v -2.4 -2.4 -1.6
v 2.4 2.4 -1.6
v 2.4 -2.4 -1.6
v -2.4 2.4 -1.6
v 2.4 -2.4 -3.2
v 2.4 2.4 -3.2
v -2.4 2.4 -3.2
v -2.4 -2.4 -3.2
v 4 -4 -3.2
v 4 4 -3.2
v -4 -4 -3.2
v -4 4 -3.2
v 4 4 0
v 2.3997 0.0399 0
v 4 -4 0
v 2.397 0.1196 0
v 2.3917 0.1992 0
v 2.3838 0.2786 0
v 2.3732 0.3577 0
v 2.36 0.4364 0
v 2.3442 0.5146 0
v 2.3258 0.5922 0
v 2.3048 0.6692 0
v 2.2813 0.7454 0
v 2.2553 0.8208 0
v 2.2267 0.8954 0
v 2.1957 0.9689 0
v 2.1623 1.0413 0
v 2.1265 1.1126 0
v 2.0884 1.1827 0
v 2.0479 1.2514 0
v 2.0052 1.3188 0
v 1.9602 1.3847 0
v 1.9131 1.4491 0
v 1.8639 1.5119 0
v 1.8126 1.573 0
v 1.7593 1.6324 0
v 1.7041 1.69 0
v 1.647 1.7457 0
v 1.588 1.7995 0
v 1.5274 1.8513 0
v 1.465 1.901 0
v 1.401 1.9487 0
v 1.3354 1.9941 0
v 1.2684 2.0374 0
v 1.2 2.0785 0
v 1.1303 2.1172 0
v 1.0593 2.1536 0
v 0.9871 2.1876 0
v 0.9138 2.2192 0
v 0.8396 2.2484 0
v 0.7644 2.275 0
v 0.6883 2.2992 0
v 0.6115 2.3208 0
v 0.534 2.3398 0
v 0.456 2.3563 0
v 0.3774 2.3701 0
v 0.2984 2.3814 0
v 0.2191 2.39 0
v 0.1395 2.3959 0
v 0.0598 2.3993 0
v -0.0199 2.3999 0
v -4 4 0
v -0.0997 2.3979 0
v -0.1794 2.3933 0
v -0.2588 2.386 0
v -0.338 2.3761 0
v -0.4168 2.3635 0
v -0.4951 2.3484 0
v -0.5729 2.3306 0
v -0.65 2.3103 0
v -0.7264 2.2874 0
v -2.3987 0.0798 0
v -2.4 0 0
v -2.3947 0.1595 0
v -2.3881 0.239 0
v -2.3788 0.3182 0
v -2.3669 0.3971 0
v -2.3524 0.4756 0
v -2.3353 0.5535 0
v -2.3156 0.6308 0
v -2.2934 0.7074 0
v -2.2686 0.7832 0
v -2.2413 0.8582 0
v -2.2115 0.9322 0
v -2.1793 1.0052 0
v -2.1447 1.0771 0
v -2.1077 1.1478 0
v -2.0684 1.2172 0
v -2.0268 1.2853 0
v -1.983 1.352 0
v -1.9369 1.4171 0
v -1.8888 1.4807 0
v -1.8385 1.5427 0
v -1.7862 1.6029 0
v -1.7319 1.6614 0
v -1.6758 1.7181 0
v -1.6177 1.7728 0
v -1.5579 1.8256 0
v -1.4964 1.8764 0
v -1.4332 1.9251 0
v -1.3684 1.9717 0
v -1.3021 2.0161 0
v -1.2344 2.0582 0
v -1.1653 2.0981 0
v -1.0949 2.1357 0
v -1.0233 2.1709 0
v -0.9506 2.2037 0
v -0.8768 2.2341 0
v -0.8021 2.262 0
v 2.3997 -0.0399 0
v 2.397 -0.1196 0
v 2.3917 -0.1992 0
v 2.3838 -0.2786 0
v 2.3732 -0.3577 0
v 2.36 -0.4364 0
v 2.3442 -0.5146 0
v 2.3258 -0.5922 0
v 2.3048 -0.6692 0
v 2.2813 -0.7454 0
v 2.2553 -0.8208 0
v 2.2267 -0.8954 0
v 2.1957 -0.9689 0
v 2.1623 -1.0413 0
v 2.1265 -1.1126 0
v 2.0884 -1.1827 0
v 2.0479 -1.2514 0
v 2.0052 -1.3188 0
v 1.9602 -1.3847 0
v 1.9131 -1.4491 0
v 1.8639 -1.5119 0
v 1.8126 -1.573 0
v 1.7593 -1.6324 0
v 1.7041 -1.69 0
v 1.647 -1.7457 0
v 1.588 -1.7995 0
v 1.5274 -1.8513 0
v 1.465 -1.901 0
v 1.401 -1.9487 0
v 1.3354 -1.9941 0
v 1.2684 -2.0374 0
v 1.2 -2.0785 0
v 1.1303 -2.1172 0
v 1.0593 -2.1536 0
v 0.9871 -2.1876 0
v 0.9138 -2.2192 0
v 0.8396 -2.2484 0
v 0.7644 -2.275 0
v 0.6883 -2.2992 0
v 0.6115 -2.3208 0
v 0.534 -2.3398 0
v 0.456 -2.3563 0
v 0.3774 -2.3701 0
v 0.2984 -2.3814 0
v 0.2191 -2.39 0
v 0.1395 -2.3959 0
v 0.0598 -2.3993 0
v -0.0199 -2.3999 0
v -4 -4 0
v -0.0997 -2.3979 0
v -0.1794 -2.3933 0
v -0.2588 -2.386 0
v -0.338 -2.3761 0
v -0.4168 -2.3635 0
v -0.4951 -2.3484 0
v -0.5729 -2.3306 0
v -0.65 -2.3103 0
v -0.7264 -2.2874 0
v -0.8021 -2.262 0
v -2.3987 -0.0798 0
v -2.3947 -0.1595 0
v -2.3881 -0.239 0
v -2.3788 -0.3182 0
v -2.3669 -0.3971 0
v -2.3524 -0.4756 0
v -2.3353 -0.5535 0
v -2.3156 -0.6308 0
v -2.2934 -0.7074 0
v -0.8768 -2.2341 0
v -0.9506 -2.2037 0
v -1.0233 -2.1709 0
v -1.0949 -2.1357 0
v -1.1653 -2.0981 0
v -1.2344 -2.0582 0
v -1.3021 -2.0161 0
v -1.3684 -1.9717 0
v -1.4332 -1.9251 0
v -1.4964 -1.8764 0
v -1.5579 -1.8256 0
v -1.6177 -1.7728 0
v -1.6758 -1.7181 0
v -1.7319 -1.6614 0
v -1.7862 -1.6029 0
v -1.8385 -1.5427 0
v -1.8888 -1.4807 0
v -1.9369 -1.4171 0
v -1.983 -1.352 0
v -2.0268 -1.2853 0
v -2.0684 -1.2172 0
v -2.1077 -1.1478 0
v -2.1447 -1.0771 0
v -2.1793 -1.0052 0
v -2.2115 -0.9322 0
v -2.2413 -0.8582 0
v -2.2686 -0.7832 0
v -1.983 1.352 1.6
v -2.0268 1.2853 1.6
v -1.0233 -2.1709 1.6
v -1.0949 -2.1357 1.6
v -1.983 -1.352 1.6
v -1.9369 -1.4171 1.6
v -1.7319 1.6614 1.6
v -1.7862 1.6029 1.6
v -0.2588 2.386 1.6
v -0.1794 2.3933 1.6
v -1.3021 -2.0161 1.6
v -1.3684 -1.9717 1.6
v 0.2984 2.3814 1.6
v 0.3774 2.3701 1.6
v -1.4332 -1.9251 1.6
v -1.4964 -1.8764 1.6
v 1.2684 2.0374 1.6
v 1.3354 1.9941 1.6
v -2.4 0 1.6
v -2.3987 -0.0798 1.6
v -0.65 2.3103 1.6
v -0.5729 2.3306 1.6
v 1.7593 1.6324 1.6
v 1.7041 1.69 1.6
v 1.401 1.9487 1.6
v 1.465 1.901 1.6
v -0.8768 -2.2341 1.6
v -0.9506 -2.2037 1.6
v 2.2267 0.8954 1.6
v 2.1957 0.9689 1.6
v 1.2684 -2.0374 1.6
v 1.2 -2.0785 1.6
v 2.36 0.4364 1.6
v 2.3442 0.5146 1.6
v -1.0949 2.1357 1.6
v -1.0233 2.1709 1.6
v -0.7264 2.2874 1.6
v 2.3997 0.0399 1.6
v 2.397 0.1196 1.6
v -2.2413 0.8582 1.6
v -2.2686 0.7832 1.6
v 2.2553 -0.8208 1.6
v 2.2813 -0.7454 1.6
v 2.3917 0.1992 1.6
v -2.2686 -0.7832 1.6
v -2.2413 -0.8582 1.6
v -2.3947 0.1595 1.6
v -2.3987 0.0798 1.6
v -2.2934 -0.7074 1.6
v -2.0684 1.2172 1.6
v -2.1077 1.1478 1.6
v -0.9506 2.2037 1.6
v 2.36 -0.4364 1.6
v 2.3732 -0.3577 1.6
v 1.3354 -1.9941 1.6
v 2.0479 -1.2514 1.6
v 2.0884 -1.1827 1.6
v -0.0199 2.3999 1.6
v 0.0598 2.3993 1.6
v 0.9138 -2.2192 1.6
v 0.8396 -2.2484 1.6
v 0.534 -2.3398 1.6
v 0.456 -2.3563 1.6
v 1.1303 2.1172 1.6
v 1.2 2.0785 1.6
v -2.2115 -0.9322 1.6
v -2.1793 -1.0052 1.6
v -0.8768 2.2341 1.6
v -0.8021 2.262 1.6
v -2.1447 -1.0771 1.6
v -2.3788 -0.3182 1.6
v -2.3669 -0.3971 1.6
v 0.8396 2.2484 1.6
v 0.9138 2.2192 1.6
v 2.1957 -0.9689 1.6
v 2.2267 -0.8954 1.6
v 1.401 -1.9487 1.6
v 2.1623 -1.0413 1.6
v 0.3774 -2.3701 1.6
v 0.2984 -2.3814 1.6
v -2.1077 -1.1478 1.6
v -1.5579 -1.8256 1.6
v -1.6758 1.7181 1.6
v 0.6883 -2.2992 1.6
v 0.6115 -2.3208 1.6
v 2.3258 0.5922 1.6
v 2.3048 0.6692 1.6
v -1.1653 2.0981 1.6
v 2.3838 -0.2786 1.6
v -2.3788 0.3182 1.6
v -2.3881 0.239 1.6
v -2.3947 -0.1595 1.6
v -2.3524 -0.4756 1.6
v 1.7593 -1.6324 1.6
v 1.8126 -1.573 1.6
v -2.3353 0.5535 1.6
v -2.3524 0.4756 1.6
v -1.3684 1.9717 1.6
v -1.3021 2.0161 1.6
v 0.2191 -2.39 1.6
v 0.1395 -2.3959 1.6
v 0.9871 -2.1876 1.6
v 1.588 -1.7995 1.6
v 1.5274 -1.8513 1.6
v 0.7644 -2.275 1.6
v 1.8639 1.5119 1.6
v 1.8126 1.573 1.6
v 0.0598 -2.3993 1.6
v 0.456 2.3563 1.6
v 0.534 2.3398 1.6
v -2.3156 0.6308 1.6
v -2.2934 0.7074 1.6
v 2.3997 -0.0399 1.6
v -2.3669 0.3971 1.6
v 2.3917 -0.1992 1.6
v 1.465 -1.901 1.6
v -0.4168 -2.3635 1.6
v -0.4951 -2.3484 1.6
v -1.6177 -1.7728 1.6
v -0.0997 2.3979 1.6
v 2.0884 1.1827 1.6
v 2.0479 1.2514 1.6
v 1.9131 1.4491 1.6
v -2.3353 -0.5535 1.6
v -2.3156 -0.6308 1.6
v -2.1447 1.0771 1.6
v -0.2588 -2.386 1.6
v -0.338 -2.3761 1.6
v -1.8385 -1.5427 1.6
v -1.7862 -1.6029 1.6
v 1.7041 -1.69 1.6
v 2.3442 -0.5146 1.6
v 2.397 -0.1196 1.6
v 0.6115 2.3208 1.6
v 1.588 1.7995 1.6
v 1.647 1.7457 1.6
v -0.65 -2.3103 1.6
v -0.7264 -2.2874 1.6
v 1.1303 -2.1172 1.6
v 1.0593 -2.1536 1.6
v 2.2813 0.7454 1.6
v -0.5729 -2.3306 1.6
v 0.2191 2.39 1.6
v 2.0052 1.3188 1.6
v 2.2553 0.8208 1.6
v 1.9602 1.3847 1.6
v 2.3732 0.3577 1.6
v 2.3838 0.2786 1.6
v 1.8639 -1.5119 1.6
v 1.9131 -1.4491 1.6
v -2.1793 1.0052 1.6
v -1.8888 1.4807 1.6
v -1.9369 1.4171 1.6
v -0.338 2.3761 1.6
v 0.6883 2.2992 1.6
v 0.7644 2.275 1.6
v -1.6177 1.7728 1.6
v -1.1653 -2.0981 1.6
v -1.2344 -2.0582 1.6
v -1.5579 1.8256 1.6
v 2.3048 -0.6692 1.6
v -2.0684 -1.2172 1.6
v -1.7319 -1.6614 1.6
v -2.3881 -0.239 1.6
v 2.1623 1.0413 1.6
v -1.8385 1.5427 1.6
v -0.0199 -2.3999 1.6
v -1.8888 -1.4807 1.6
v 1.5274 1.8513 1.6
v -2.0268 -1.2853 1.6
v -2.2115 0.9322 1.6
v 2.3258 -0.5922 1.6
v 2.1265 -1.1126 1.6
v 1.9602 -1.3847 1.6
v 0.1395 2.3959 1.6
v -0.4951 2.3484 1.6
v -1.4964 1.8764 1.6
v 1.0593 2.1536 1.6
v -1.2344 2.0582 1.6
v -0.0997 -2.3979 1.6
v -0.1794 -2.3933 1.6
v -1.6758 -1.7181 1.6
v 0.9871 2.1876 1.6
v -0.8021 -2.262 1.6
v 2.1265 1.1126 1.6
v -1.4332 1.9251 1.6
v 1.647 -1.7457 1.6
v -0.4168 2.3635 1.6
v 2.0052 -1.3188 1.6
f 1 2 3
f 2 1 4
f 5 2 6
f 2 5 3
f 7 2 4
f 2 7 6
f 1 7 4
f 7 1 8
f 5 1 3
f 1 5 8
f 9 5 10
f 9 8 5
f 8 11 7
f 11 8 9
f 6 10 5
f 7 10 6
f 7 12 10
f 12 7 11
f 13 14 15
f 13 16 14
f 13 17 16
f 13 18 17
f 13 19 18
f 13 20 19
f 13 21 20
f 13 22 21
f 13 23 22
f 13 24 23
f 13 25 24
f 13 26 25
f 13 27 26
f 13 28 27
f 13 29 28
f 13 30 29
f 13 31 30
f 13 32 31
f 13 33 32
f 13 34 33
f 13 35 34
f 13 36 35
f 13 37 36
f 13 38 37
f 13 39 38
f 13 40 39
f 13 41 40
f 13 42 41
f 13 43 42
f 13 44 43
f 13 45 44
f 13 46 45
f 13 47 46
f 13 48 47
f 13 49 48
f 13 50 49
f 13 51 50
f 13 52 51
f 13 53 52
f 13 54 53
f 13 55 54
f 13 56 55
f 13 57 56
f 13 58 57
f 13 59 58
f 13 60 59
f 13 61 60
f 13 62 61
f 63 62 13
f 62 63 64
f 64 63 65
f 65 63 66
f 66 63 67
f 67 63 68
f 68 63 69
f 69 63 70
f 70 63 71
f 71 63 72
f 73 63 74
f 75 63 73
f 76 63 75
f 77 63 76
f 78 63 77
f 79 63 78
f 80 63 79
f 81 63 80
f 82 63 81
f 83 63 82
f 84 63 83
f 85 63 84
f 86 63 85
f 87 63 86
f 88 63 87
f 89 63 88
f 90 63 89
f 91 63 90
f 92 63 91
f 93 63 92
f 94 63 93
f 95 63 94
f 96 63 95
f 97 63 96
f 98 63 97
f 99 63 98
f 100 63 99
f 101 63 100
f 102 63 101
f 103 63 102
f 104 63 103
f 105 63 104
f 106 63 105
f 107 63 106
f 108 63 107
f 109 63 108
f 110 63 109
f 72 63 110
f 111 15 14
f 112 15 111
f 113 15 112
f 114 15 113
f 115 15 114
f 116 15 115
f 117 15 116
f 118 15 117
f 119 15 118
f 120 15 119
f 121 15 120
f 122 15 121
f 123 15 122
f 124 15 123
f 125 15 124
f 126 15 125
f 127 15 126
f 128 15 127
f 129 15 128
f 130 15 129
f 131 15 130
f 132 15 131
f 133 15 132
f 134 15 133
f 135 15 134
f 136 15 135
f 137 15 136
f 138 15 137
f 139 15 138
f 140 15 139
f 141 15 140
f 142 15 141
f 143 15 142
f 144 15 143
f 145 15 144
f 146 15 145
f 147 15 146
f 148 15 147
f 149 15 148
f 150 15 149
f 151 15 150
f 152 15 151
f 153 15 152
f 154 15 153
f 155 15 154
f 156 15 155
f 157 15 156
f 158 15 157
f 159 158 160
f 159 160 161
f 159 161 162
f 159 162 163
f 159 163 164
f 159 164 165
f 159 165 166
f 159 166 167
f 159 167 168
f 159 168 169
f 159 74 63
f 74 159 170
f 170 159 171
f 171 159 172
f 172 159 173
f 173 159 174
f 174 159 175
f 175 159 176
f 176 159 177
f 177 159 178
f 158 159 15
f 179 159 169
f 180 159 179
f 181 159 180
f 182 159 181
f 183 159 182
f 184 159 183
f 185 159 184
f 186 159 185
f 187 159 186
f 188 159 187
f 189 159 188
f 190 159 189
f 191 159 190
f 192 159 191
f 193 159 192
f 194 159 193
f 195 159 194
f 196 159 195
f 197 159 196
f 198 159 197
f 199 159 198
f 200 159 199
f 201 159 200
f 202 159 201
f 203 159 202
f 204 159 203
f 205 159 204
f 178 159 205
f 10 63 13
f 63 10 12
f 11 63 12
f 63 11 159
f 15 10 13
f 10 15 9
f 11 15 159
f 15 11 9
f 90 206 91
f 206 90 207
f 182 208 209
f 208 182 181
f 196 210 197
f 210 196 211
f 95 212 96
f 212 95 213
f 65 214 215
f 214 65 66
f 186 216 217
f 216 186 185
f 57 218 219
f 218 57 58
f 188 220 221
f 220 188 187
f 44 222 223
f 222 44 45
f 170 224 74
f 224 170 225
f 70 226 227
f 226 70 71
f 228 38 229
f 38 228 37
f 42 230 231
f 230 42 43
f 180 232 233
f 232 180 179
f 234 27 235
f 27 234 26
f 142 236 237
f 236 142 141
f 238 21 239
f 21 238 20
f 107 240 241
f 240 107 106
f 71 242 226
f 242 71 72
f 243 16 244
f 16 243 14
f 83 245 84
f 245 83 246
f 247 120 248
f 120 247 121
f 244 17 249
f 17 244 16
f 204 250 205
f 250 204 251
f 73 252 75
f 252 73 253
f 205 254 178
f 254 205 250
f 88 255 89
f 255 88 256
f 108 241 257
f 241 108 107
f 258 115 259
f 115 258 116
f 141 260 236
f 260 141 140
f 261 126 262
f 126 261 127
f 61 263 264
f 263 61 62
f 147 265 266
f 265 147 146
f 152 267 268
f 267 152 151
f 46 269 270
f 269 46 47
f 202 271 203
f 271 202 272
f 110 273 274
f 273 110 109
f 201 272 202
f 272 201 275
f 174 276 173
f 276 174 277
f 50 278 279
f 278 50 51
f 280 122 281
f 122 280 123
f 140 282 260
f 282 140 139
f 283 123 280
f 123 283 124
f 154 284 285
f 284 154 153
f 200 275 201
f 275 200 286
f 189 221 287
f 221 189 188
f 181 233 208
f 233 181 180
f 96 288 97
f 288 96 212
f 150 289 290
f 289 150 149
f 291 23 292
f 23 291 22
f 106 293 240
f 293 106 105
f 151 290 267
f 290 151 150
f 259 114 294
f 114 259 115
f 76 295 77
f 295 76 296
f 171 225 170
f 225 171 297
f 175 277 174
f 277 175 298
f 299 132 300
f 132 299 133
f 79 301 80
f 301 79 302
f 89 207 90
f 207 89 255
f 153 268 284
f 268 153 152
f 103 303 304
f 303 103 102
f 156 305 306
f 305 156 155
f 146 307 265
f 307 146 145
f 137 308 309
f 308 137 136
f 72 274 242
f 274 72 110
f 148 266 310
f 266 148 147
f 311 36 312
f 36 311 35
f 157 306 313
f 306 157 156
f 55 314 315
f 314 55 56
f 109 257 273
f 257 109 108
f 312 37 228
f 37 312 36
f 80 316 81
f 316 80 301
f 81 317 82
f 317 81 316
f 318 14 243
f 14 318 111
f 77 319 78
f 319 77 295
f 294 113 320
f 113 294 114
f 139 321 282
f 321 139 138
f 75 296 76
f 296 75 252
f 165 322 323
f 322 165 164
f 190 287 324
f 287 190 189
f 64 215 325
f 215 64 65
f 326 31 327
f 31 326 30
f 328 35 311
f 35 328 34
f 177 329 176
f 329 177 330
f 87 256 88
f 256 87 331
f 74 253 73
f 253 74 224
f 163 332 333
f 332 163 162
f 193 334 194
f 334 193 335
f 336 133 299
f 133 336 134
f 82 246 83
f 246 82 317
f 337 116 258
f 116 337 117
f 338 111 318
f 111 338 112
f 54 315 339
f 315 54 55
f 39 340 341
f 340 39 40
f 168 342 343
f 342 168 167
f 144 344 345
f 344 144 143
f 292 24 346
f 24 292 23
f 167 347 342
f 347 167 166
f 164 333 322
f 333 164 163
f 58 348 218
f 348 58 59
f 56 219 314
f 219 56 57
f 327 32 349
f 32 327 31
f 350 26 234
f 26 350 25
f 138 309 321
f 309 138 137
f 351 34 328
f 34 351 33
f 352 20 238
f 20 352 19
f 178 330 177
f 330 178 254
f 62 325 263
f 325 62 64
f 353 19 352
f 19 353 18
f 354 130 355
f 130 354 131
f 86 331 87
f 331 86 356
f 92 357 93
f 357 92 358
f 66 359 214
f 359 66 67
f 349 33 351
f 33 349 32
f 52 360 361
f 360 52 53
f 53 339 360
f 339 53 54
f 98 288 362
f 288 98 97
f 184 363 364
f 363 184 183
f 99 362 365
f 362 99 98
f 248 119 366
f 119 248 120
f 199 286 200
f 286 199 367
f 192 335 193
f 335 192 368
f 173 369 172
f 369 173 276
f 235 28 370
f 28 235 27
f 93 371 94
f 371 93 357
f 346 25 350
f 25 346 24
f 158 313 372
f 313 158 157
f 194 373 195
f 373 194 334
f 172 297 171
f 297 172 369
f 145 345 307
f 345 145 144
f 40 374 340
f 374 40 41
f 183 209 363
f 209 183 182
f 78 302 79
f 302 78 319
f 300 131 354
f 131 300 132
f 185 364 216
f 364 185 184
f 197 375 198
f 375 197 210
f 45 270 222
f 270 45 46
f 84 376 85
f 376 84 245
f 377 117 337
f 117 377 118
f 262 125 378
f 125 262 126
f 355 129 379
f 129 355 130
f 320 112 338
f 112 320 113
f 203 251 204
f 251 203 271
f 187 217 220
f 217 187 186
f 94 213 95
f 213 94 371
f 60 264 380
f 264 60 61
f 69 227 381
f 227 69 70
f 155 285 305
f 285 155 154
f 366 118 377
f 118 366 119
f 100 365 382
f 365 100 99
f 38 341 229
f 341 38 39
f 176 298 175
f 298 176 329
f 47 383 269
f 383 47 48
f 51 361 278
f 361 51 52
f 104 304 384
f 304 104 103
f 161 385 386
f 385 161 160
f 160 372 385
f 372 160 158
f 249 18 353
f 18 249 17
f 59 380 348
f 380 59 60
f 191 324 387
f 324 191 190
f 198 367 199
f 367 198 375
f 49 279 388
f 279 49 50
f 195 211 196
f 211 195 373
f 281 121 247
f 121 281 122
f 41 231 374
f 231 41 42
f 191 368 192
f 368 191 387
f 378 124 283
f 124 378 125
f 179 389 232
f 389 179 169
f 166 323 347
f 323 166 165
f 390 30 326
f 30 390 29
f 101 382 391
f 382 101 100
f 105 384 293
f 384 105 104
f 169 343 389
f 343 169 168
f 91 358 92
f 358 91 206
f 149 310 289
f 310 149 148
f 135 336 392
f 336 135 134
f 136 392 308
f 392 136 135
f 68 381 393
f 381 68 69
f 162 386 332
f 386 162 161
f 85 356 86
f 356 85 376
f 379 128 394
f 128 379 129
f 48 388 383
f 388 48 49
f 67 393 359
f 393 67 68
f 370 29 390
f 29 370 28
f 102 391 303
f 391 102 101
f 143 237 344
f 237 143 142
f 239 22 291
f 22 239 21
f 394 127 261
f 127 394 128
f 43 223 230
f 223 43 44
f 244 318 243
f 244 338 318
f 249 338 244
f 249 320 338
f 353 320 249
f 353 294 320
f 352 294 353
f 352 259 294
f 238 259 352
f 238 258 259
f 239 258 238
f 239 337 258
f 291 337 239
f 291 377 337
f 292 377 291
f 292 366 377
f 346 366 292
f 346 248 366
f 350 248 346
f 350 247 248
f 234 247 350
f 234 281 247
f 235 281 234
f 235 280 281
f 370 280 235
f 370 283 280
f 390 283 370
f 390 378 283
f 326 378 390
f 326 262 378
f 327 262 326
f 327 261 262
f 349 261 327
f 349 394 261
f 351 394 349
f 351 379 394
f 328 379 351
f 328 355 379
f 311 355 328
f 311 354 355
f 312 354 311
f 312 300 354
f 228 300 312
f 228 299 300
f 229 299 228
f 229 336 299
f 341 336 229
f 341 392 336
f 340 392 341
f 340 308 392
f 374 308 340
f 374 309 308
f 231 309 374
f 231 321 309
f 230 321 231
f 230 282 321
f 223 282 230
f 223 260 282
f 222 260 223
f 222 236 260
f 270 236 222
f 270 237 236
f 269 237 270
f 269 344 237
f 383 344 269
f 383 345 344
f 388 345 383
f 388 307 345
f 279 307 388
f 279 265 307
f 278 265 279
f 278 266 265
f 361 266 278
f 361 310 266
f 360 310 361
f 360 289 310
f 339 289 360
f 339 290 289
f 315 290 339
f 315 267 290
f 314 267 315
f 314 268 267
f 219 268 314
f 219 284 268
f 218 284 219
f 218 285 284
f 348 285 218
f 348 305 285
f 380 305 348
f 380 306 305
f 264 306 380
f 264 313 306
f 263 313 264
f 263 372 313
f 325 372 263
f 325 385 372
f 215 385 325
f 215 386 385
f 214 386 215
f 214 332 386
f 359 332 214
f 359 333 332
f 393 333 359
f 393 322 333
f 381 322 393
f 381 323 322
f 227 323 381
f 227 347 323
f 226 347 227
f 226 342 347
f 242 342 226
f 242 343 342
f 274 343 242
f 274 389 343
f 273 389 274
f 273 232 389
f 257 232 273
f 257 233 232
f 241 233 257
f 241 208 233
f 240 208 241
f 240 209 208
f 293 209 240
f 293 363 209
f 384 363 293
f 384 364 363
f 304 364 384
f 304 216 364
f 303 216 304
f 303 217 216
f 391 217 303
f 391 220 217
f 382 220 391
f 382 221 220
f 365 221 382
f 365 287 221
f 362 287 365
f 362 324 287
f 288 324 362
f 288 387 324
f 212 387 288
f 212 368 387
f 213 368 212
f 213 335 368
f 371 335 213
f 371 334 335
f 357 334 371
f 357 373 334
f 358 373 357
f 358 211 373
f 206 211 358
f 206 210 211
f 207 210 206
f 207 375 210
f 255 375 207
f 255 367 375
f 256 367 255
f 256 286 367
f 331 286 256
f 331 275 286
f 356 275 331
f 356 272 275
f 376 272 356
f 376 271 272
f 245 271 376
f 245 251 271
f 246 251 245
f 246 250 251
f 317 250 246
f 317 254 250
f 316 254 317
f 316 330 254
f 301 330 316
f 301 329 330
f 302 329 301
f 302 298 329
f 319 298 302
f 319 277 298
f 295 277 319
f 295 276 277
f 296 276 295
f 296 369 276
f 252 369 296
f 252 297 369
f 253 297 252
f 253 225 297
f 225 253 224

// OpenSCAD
// file: ../p/stud3.scad
use <../lib.scad>
use <4-4cyli.scad>
use <4-4disc.scad>
use <4-4edge.scad>
$fa=1; $fs=0.2;
function ldraw_lib__stud3(realsolid=false) = realsolid ? 
    [openscad(translate([0,0,-eps()], o=cylinder(4+eps(), r=4)),2)] : [
// 0 Stud Tube Solid
// 0 Name: stud3.dat
// 0 Author: James Jessiman
// 0 !LDRAW_ORG Primitive UPDATE 2012-01
// 0 !LICENSE Licensed under CC BY 2.0 and CC BY 4.0 : see CAreadme.txt
// 
// 0 BFC CERTIFY CCW
  [0,"BFC","CERTIFY"],
  [0,"BFC","CCW"],
// 
// 0 !HISTORY 2002-04-04 [sbliss] Modified for BFC compliance
// 0 !HISTORY 2002-04-25 [PTadmin] Official Update 2002-02
// 0 !HISTORY 2007-06-24 [PTadmin] Header formatted for Contributor Agreement
// 0 !HISTORY 2008-07-01 [PTadmin] Official Update 2008-01
// 0 !HISTORY 2012-02-16 [Philo] Changed to CCW
// 0 !HISTORY 2012-03-30 [PTadmin] Official Update 2012-01
// 
// 
// 1 16 0 -4 0 4 0 0 0 1 0 0 0 4 4-4edge.dat
  [1,16,0,-4,0,4,0,0,0,1,0,0,0,4, ldraw_lib__4_4edge(realsolid)],
// 1 16 0 0 0 4 0 0 0 1 0 0 0 4 4-4edge.dat
  [1,16,0,0,0,4,0,0,0,1,0,0,0,4, ldraw_lib__4_4edge(realsolid)],
// 1 16 0 -4 0 4 0 0 0 1 0 0 0 4 4-4disc.dat
  [1,16,0,-4,0,4,0,0,0,1,0,0,0,4, ldraw_lib__4_4disc(realsolid)],
// 1 16 0 -4 0 4 0 0 0 4 0 0 0 4 4-4cyli.dat
  [1,16,0,-4,0,4,0,0,0,4,0,0,0,4, ldraw_lib__4_4cyli(realsolid)],
];
module ldraw_lib__stud3(step=0, col=false, unit=2/5, alt=false, line=0.2, solid=!$preview)
    makepoly(ldraw_lib__stud3(solid), step=step, col=col, unit=unit, alt=alt, line=line, solid=solid);
ldraw_lib__stud3(line=0.2);
// file: ../p/4-4edge.scad
use <../lib.scad>
$fa=1; $fs=0.2;
function ldraw_lib__4_4edge(realsolid=false) = [
// 0 Circle 1.0
// 0 Name: 4-4edge.dat
// 0 Author: James Jessiman
// 0 !LDRAW_ORG Primitive UPDATE 2017-01
// 0 !LICENSE Licensed under CC BY 2.0 and CC BY 4.0 : see CAreadme.txt
// 
// 0 BFC CERTIFY CCW
  [0,"BFC","CERTIFY"],
  [0,"BFC","CCW"],
// 
// 0 !HISTORY 1998-12-15 [PTadmin] Official Update 1998-10
// 0 !HISTORY 2005-12-28 [PTadmin] Official Update 2005-01
// 0 !HISTORY 2007-06-24 [PTadmin] Header formatted for Contributor Agreement
// 0 !HISTORY 2008-07-01 [PTadmin] Official Update 2008-01
// 0 !HISTORY 2017-01-15 [Steffen] BFCed
// 0 !HISTORY 2017-12-30 [PTadmin] Official Update 2017-01
// 
// 
// 2 24 1 0 0 0.9239 0 0.3827
  [2,24,1,0,0,0.9239,0,0.3827],
// 2 24 0.9239 0 0.3827 0.7071 0 0.7071
  [2,24,0.9239,0,0.3827,0.7071,0,0.7071],
// 2 24 0.7071 0 0.7071 0.3827 0 0.9239
  [2,24,0.7071,0,0.7071,0.3827,0,0.9239],
// 2 24 0.3827 0 0.9239 0 0 1
  [2,24,0.3827,0,0.9239,0,0,1],
// 2 24 0 0 1 -0.3827 0 0.9239
  [2,24,0,0,1,-0.3827,0,0.9239],
// 2 24 -0.3827 0 0.9239 -0.7071 0 0.7071
  [2,24,-0.3827,0,0.9239,-0.7071,0,0.7071],
// 2 24 -0.7071 0 0.7071 -0.9239 0 0.3827
  [2,24,-0.7071,0,0.7071,-0.9239,0,0.3827],
// 2 24 -0.9239 0 0.3827 -1 0 -0
  [2,24,-0.9239,0,0.3827,-1,0,-0],
// 2 24 -1 0 -0 -0.9239 0 -0.3827
  [2,24,-1,0,-0,-0.9239,0,-0.3827],
// 2 24 -0.9239 0 -0.3827 -0.7071 0 -0.7071
  [2,24,-0.9239,0,-0.3827,-0.7071,0,-0.7071],
// 2 24 -0.7071 0 -0.7071 -0.3827 0 -0.9239
  [2,24,-0.7071,0,-0.7071,-0.3827,0,-0.9239],
// 2 24 -0.3827 0 -0.9239 0 0 -1
  [2,24,-0.3827,0,-0.9239,0,0,-1],
// 2 24 0 0 -1 0.3827 0 -0.9239
  [2,24,0,0,-1,0.3827,0,-0.9239],
// 2 24 0.3827 0 -0.9239 0.7071 0 -0.7071
  [2,24,0.3827,0,-0.9239,0.7071,0,-0.7071],
// 2 24 0.7071 0 -0.7071 0.9239 0 -0.3827
  [2,24,0.7071,0,-0.7071,0.9239,0,-0.3827],
// 2 24 0.9239 0 -0.3827 1 0 0
  [2,24,0.9239,0,-0.3827,1,0,0],
];
module ldraw_lib__4_4edge(step=0, col=false, unit=2/5, alt=false, line=0.2, solid=!$preview)
    makepoly(ldraw_lib__4_4edge(solid), step=step, col=col, unit=unit, alt=alt, line=line, solid=solid);
ldraw_lib__4_4edge(line=0.2);
// file: ../p/4-4disc.scad
use <../lib.scad>
$fa=1; $fs=0.2;
function ldraw_lib__4_4disc(realsolid=false) = [
// 0 Disc 1.0
// 0 Name: 4-4disc.dat
// 0 Author: James Jessiman
// 0 !LDRAW_ORG Primitive UPDATE 2002-02
// 0 !LICENSE Licensed under CC BY 2.0 and CC BY 4.0 : see CAreadme.txt
// 
// 0 BFC CERTIFY CCW
  [0,"BFC","CERTIFY"],
  [0,"BFC","CCW"],
// 
// 0 !HISTORY 1998-12-15 [PTadmin] Official Update 1998-10
// 0 !HISTORY 2002-03-23 [sbliss] Added BFC statement
// 0 !HISTORY 2002-04-25 [PTadmin] Official Update 2002-02
// 0 !HISTORY 2007-06-24 [PTadmin] Header formatted for Contributor Agreement
// 0 !HISTORY 2008-07-01 [PTadmin] Official Update 2008-01
// 
// 
// 3 16 0 0 0 1 0 0 0.9239 0 0.3827
  [3,16,0,0,0,1,0,0,0.9239,0,0.3827],
// 3 16 0 0 0 0.9239 0 0.3827 0.7071 0 0.7071
  [3,16,0,0,0,0.9239,0,0.3827,0.7071,0,0.7071],
// 3 16 0 0 0 0.7071 0 0.7071 0.3827 0 0.9239
  [3,16,0,0,0,0.7071,0,0.7071,0.3827,0,0.9239],
// 3 16 0 0 0 0.3827 0 0.9239 0 0 1
  [3,16,0,0,0,0.3827,0,0.9239,0,0,1],
// 3 16 0 0 0 0 0 1 -0.3827 0 0.9239
  [3,16,0,0,0,0,0,1,-0.3827,0,0.9239],
// 3 16 0 0 0 -0.3827 0 0.9239 -0.7071 0 0.7071
  [3,16,0,0,0,-0.3827,0,0.9239,-0.7071,0,0.7071],
// 3 16 0 0 0 -0.7071 0 0.7071 -0.9239 0 0.3827
  [3,16,0,0,0,-0.7071,0,0.7071,-0.9239,0,0.3827],
// 3 16 0 0 0 -0.9239 0 0.3827 -1 0 -0
  [3,16,0,0,0,-0.9239,0,0.3827,-1,0,-0],
// 3 16 0 0 0 -1 0 -0 -0.9239 0 -0.3827
  [3,16,0,0,0,-1,0,-0,-0.9239,0,-0.3827],
// 3 16 0 0 0 -0.9239 0 -0.3827 -0.7071 0 -0.7071
  [3,16,0,0,0,-0.9239,0,-0.3827,-0.7071,0,-0.7071],
// 3 16 0 0 0 -0.7071 0 -0.7071 -0.3827 0 -0.9239
  [3,16,0,0,0,-0.7071,0,-0.7071,-0.3827,0,-0.9239],
// 3 16 0 0 0 -0.3827 0 -0.9239 0 0 -1
  [3,16,0,0,0,-0.3827,0,-0.9239,0,0,-1],
// 3 16 0 0 0 0 0 -1 0.3827 0 -0.9239
  [3,16,0,0,0,0,0,-1,0.3827,0,-0.9239],
// 3 16 0 0 0 0.3827 0 -0.9239 0.7071 0 -0.7071
  [3,16,0,0,0,0.3827,0,-0.9239,0.7071,0,-0.7071],
// 3 16 0 0 0 0.7071 0 -0.7071 0.9239 0 -0.3827
  [3,16,0,0,0,0.7071,0,-0.7071,0.9239,0,-0.3827],
// 3 16 0 0 0 0.9239 0 -0.3827 1 0 0
  [3,16,0,0,0,0.9239,0,-0.3827,1,0,0],
// 0
];
module ldraw_lib__4_4disc(step=0, col=false, unit=2/5, alt=false, line=0.2, solid=!$preview)
    makepoly(ldraw_lib__4_4disc(solid), step=step, col=col, unit=unit, alt=alt, line=line, solid=solid);
ldraw_lib__4_4disc(line=0.2);
// file: ../p/4-4cyli.scad
use <../lib.scad>
$fa=1; $fs=0.2;
function ldraw_lib__4_4cyli(realsolid=false) = [
// 0 Cylinder 1.0
// 0 Name: 4-4cyli.dat
// 0 Author: James Jessiman
// 0 !LDRAW_ORG Primitive UPDATE 2005-01
// 0 !LICENSE Licensed under CC BY 2.0 and CC BY 4.0 : see CAreadme.txt
// 
// 0 BFC CERTIFY CCW
  [0,"BFC","CERTIFY"],
  [0,"BFC","CCW"],
// 
// 0 !HISTORY 1998-12-15 [PTadmin] Official Update 1998-10
// 0 !HISTORY 2002-03-23 [sbliss] Added BFC statement; merged headers from files in distributions LDraw 0.27 and Complete.
// 0 !HISTORY 2002-04-25 [PTadmin] Official Update 2002-02
// 0 !HISTORY 2004-12-14 [guyvivan] BFC CCW
// 0 !HISTORY 2005-12-28 [PTadmin] Official Update 2005-01
// 0 !HISTORY 2007-06-24 [PTadmin] Header formatted for Contributor Agreement
// 0 !HISTORY 2008-07-01 [PTadmin] Official Update 2008-01
// 
// 
// 4 16 1 1 0 0.9239 1 0.3827 0.9239 0 0.3827 1 0 0
  [4,16,1,1,0,0.9239,1,0.3827,0.9239,0,0.3827,1,0,0],
// 5 24 1 0 0 1 1 0 0.9239 0 0.3827 0.9239 0 -0.3827
  [5,24,1,0,0,1,1,0,0.9239,0,0.3827,0.9239,0,-0.3827],
// 4 16 0.9239 1 0.3827 0.7071 1 0.7071 0.7071 0 0.7071 0.9239 0 0.3827
  [4,16,0.9239,1,0.3827,0.7071,1,0.7071,0.7071,0,0.7071,0.9239,0,0.3827],
// 5 24 0.9239 0 0.3827 0.9239 1 0.3827 0.7071 0 0.7071 1 0 0
  [5,24,0.9239,0,0.3827,0.9239,1,0.3827,0.7071,0,0.7071,1,0,0],
// 4 16 0.7071 1 0.7071 0.3827 1 0.9239 0.3827 0 0.9239 0.7071 0 0.7071
  [4,16,0.7071,1,0.7071,0.3827,1,0.9239,0.3827,0,0.9239,0.7071,0,0.7071],
// 5 24 0.7071 0 0.7071 0.7071 1 0.7071 0.3827 0 0.9239 0.9239 0 0.3827
  [5,24,0.7071,0,0.7071,0.7071,1,0.7071,0.3827,0,0.9239,0.9239,0,0.3827],
// 4 16 0.3827 1 0.9239 0 1 1 0 0 1 0.3827 0 0.9239
  [4,16,0.3827,1,0.9239,0,1,1,0,0,1,0.3827,0,0.9239],
// 5 24 0.3827 0 0.9239 0.3827 1 0.9239 0 0 1 0.7071 0 0.7071
  [5,24,0.3827,0,0.9239,0.3827,1,0.9239,0,0,1,0.7071,0,0.7071],
// 4 16 0 1 1 -0.3827 1 0.9239 -0.3827 0 0.9239 0 0 1
  [4,16,0,1,1,-0.3827,1,0.9239,-0.3827,0,0.9239,0,0,1],
// 5 24 0 0 1 0 1 1 -0.3827 0 0.9239 0.3827 0 0.9239
  [5,24,0,0,1,0,1,1,-0.3827,0,0.9239,0.3827,0,0.9239],
// 4 16 -0.3827 1 0.9239 -0.7071 1 0.7071 -0.7071 0 0.7071 -0.3827 0 0.9239
  [4,16,-0.3827,1,0.9239,-0.7071,1,0.7071,-0.7071,0,0.7071,-0.3827,0,0.9239],
// 5 24 -0.3827 0 0.9239 -0.3827 1 0.9239 -0.7071 0 0.7071 0 0 1
  [5,24,-0.3827,0,0.9239,-0.3827,1,0.9239,-0.7071,0,0.7071,0,0,1],
// 4 16 -0.7071 1 0.7071 -0.9239 1 0.3827 -0.9239 0 0.3827 -0.7071 0 0.7071
  [4,16,-0.7071,1,0.7071,-0.9239,1,0.3827,-0.9239,0,0.3827,-0.7071,0,0.7071],
// 5 24 -0.7071 0 0.7071 -0.7071 1 0.7071 -0.9239 0 0.3827 -0.3827 0 0.9239
  [5,24,-0.7071,0,0.7071,-0.7071,1,0.7071,-0.9239,0,0.3827,-0.3827,0,0.9239],
// 4 16 -0.9239 1 0.3827 -1 1 0 -1 0 0 -0.9239 0 0.3827
  [4,16,-0.9239,1,0.3827,-1,1,0,-1,0,0,-0.9239,0,0.3827],
// 5 24 -0.9239 0 0.3827 -0.9239 1 0.3827 -1 0 0 -0.7071 0 0.7071
  [5,24,-0.9239,0,0.3827,-0.9239,1,0.3827,-1,0,0,-0.7071,0,0.7071],
// 4 16 -1 1 0 -0.9239 1 -0.3827 -0.9239 0 -0.3827 -1 0 0
  [4,16,-1,1,0,-0.9239,1,-0.3827,-0.9239,0,-0.3827,-1,0,0],
// 5 24 -1 0 0 -1 1 0 -0.9239 0 -0.3827 -0.9239 0 0.3827
  [5,24,-1,0,0,-1,1,0,-0.9239,0,-0.3827,-0.9239,0,0.3827],
// 4 16 -0.9239 1 -0.3827 -0.7071 1 -0.7071 -0.7071 0 -0.7071 -0.9239 0 -0.3827
  [4,16,-0.9239,1,-0.3827,-0.7071,1,-0.7071,-0.7071,0,-0.7071,-0.9239,0,-0.3827],
// 5 24 -0.9239 0 -0.3827 -0.9239 1 -0.3827 -0.7071 0 -0.7071 -1 0 0
  [5,24,-0.9239,0,-0.3827,-0.9239,1,-0.3827,-0.7071,0,-0.7071,-1,0,0],
// 4 16 -0.7071 1 -0.7071 -0.3827 1 -0.9239 -0.3827 0 -0.9239 -0.7071 0 -0.7071
  [4,16,-0.7071,1,-0.7071,-0.3827,1,-0.9239,-0.3827,0,-0.9239,-0.7071,0,-0.7071],
// 5 24 -0.7071 0 -0.7071 -0.7071 1 -0.7071 -0.3827 0 -0.9239 -0.9239 0 -0.3827
  [5,24,-0.7071,0,-0.7071,-0.7071,1,-0.7071,-0.3827,0,-0.9239,-0.9239,0,-0.3827],
// 4 16 -0.3827 1 -0.9239 0 1 -1 0 0 -1 -0.3827 0 -0.9239
  [4,16,-0.3827,1,-0.9239,0,1,-1,0,0,-1,-0.3827,0,-0.9239],
// 5 24 -0.3827 0 -0.9239 -0.3827 1 -0.9239 0 0 -1 -0.7071 0 -0.7071
  [5,24,-0.3827,0,-0.9239,-0.3827,1,-0.9239,0,0,-1,-0.7071,0,-0.7071],
// 4 16 0 1 -1 0.3827 1 -0.9239 0.3827 0 -0.9239 0 0 -1
  [4,16,0,1,-1,0.3827,1,-0.9239,0.3827,0,-0.9239,0,0,-1],
// 5 24 0 0 -1 0 1 -1 0.3827 0 -0.9239 -0.3827 0 -0.9239
  [5,24,0,0,-1,0,1,-1,0.3827,0,-0.9239,-0.3827,0,-0.9239],
// 4 16 0.3827 1 -0.9239 0.7071 1 -0.7071 0.7071 0 -0.7071 0.3827 0 -0.9239
  [4,16,0.3827,1,-0.9239,0.7071,1,-0.7071,0.7071,0,-0.7071,0.3827,0,-0.9239],
// 5 24 0.3827 0 -0.9239 0.3827 1 -0.9239 0.7071 0 -0.7071 0 0 -1
  [5,24,0.3827,0,-0.9239,0.3827,1,-0.9239,0.7071,0,-0.7071,0,0,-1],
// 4 16 0.7071 1 -0.7071 0.9239 1 -0.3827 0.9239 0 -0.3827 0.7071 0 -0.7071
  [4,16,0.7071,1,-0.7071,0.9239,1,-0.3827,0.9239,0,-0.3827,0.7071,0,-0.7071],
// 5 24 0.7071 0 -0.7071 0.7071 1 -0.7071 0.9239 0 -0.3827 0.3827 0 -0.9239
  [5,24,0.7071,0,-0.7071,0.7071,1,-0.7071,0.9239,0,-0.3827,0.3827,0,-0.9239],
// 4 16 0.9239 1 -0.3827 1 1 0 1 0 0 0.9239 0 -0.3827
  [4,16,0.9239,1,-0.3827,1,1,0,1,0,0,0.9239,0,-0.3827],
// 5 24 0.9239 0 -0.3827 0.9239 1 -0.3827 1 0 0 0.7071 0 -0.7071
  [5,24,0.9239,0,-0.3827,0.9239,1,-0.3827,1,0,0,0.7071,0,-0.7071],
// 0
];
module ldraw_lib__4_4cyli(step=0, col=false, unit=2/5, alt=false, line=0.2, solid=!$preview)
    makepoly(ldraw_lib__4_4cyli(solid), step=step, col=col, unit=unit, alt=alt, line=line, solid=solid);
ldraw_lib__4_4cyli(line=0.2);
// file: s/3004s01.scad
use <../../lib.scad>
use <../../p/box4t.scad>
use <../../p/box5.scad>
use <../../p/stud.scad>
use <../../p/stud3.scad>
$fa=1; $fs=0.2;
function ldraw_lib__s__3004s01(realsolid=false) = [
// 0 ~Brick  1 x  2 without Front Face
// 0 Name: s\3004s01.dat
// 0 Author: James Jessiman
// 0 !LDRAW_ORG Subpart UPDATE 2003-03
// 0 !LICENSE Licensed under CC BY 2.0 and CC BY 4.0 : see CAreadme.txt
// 
// 0 BFC CERTIFY CCW
  [0,"BFC","CERTIFY"],
  [0,"BFC","CCW"],
// 
// 0 !HISTORY 2003-09-07 [jriley] Subfiling, BFC
// 0 !HISTORY 2003-12-19 [PTadmin] Official Update 2003-03
// 0 !HISTORY 2007-08-29 [PTadmin] Header formatted for Contributor Agreement
// 0 !HISTORY 2008-07-01 [PTadmin] Official Update 2008-01
// 
// 
// 1 16 0 4 0 1 0 0 0 -5 0 0 0 1 stud3.dat
  [1,16,0,4,0,1,0,0,0,-5,0,0,0,1, ldraw_lib__stud3(realsolid)],
// 0 BFC INVERTNEXT
  [0,"BFC","INVERTNEXT"],
// 1 16 0 24 0 16 0 0 0 -20 0 0 0 6 box5.dat
  [1,16,0,24,0,16,0,0,0,-20,0,0,0,6, ldraw_lib__box5(realsolid)],
// 4 16 20 24 10 16 24 6 -16 24 6 -20 24 10
  [4,16,20,24,10,16,24,6,-16,24,6,-20,24,10],
// 4 16 -20 24 10 -16 24 6 -16 24 -6 -20 24 -10
  [4,16,-20,24,10,-16,24,6,-16,24,-6,-20,24,-10],
// 4 16 -20 24 -10 -16 24 -6 16 24 -6 20 24 -10
  [4,16,-20,24,-10,-16,24,-6,16,24,-6,20,24,-10],
// 4 16 20 24 -10 16 24 -6 16 24 6 20 24 10
  [4,16,20,24,-10,16,24,-6,16,24,6,20,24,10],
// 1 16 0 24 0 20 0 0 0 -24 0 0 0 10 box4t.dat
  [1,16,0,24,0,20,0,0,0,-24,0,0,0,10, ldraw_lib__box4t(realsolid)],
// 1 16 10 0 0 1 0 0 0 1 0 0 0 1 stud.dat
  [1,16,10,0,0,1,0,0,0,1,0,0,0,1, ldraw_lib__stud(realsolid)],
// 1 16 -10 0 0 1 0 0 0 1 0 0 0 1 stud.dat
  [1,16,-10,0,0,1,0,0,0,1,0,0,0,1, ldraw_lib__stud(realsolid)],
// 0
];
module ldraw_lib__s__3004s01(step=0, col=false, unit=2/5, alt=false, line=0.2, solid=!$preview)
    makepoly(ldraw_lib__s__3004s01(solid), step=step, col=col, unit=unit, alt=alt, line=line, solid=solid);
ldraw_lib__s__3004s01(line=0.2);
// file: ../p/stud.scad
use <../lib.scad>
use <4-4cyli.scad>
use <4-4disc.scad>
use <4-4edge.scad>
$fa=1; $fs=0.2;
function ldraw_lib__stud(realsolid=false) = realsolid ? 
    [openscad(translate([0,0,-eps()], o=cylinder(4+eps(), r=6)),2)] : [
// 0 Stud
// 0 Name: stud.dat
// 0 Author: James Jessiman
// 0 !LDRAW_ORG Primitive UPDATE 2012-01
// 0 !LICENSE Licensed under CC BY 2.0 and CC BY 4.0 : see CAreadme.txt
// 
// 0 BFC CERTIFY CCW
  [0,"BFC","CERTIFY"],
  [0,"BFC","CCW"],
// 
// 0 !HISTORY 2002-04-04 [sbliss] Modified for BFC compliance
// 0 !HISTORY 2002-04-25 [PTadmin] Official Update 2002-02
// 0 !HISTORY 2007-06-24 [PTadmin] Header formatted for Contributor Agreement
// 0 !HISTORY 2008-07-01 [PTadmin] Official Update 2008-01
// 0 !HISTORY 2012-02-16 [Philo] Changed to CCW
// 0 !HISTORY 2012-03-30 [PTadmin] Official Update 2012-01
// 
// 
// 1 16 0 0 0 6 0 0 0 1 0 0 0 6 4-4edge.dat
  [1,16,0,0,0,6,0,0,0,1,0,0,0,6, ldraw_lib__4_4edge(realsolid)],
// 1 16 0 -4 0 6 0 0 0 1 0 0 0 6 4-4edge.dat
  [1,16,0,-4,0,6,0,0,0,1,0,0,0,6, ldraw_lib__4_4edge(realsolid)],
// 1 16 0 0 0 6 0 0 0 -4 0 0 0 6 4-4cyli.dat
  [1,16,0,0,0,6,0,0,0,-4,0,0,0,6, ldraw_lib__4_4cyli(realsolid)],
// 1 16 0 -4 0 6 0 0 0 1 0 0 0 6 4-4disc.dat
  [1,16,0,-4,0,6,0,0,0,1,0,0,0,6, ldraw_lib__4_4disc(realsolid)],
];
module ldraw_lib__stud(step=0, col=false, unit=2/5, alt=false, line=0.2, solid=!$preview)
    makepoly(ldraw_lib__stud(solid), step=step, col=col, unit=unit, alt=alt, line=line, solid=solid);
ldraw_lib__stud(line=0.2);
// file: ../p/box5.scad
use <../lib.scad>
$fa=1; $fs=0.2;
function ldraw_lib__box5(realsolid=false) = [
// 0 Box with 5 Faces and All Edges
// 0 Name: box5.dat
// 0 Author: James Jessiman
// 0 !LDRAW_ORG Primitive UPDATE 2012-01
// 0 !LICENSE Licensed under CC BY 2.0 and CC BY 4.0 : see CAreadme.txt
// 
// 0 BFC CERTIFY CCW
  [0,"BFC","CERTIFY"],
  [0,"BFC","CCW"],
// 
// 0 !HISTORY 2002-04-03 [sbliss] Modified for BFC compliance
// 0 !HISTORY 2002-04-25 [PTadmin] Official Update 2002-02
// 0 !HISTORY 2007-06-24 [PTadmin] Header formatted for Contributor Agreement
// 0 !HISTORY 2008-07-01 [PTadmin] Official Update 2008-01
// 0 !HISTORY 2012-02-16 [Philo] Changed to CCW
// 0 !HISTORY 2012-03-30 [PTadmin] Official Update 2012-01
// 
// 
// 2 24 1 1 1 -1 1 1
  [2,24,1,1,1,-1,1,1],
// 2 24 -1 1 1 -1 1 -1
  [2,24,-1,1,1,-1,1,-1],
// 2 24 -1 1 -1 1 1 -1
  [2,24,-1,1,-1,1,1,-1],
// 2 24 1 1 -1 1 1 1
  [2,24,1,1,-1,1,1,1],
// 2 24 1 0 1 -1 0 1
  [2,24,1,0,1,-1,0,1],
// 2 24 -1 0 1 -1 0 -1
  [2,24,-1,0,1,-1,0,-1],
// 2 24 -1 0 -1 1 0 -1
  [2,24,-1,0,-1,1,0,-1],
// 2 24 1 0 -1 1 0 1
  [2,24,1,0,-1,1,0,1],
// 2 24 1 0 1 1 1 1
  [2,24,1,0,1,1,1,1],
// 2 24 -1 0 1 -1 1 1
  [2,24,-1,0,1,-1,1,1],
// 2 24 1 0 -1 1 1 -1
  [2,24,1,0,-1,1,1,-1],
// 2 24 -1 0 -1 -1 1 -1
  [2,24,-1,0,-1,-1,1,-1],
// 4 16 -1 1 1 1 1 1 1 1 -1 -1 1 -1
  [4,16,-1,1,1,1,1,1,1,1,-1,-1,1,-1],
// 4 16 -1 1 1 -1 0 1 1 0 1 1 1 1
  [4,16,-1,1,1,-1,0,1,1,0,1,1,1,1],
// 4 16 -1 1 -1 -1 0 -1 -1 0 1 -1 1 1
  [4,16,-1,1,-1,-1,0,-1,-1,0,1,-1,1,1],
// 4 16 1 1 -1 1 0 -1 -1 0 -1 -1 1 -1
  [4,16,1,1,-1,1,0,-1,-1,0,-1,-1,1,-1],
// 4 16 1 1 1 1 0 1 1 0 -1 1 1 -1
  [4,16,1,1,1,1,0,1,1,0,-1,1,1,-1],
];
module ldraw_lib__box5(step=0, col=false, unit=2/5, alt=false, line=0.2, solid=!$preview)
    makepoly(ldraw_lib__box5(solid), step=step, col=col, unit=unit, alt=alt, line=line, solid=solid);
ldraw_lib__box5(line=0.2);
// file: ../p/box4t.scad
use <../lib.scad>
$fa=1; $fs=0.2;
function ldraw_lib__box4t(realsolid=false) = [
// 0 Box with 4 Adjacent Faces and All Edges
// 0 Name: box4t.dat
// 0 Author: Tore Eriksson [Tore_Eriksson]
// 0 !LDRAW_ORG Primitive UPDATE 2003-02
// 0 !LICENSE Licensed under CC BY 2.0 and CC BY 4.0 : see CAreadme.txt
// 
// 0 BFC CERTIFY CCW
  [0,"BFC","CERTIFY"],
  [0,"BFC","CCW"],
// 
// 0 !HISTORY 1997-09-29 [PTadmin] Official Update 1997-15
// 0 !HISTORY 2002-08-31 [izanette] Modified with WINDZ for BFC compliance
// 0 !HISTORY 2003-08-01 [PTadmin] Official Update 2003-02
// 0 !HISTORY 2007-06-24 [PTadmin] Header formatted for Contributor Agreement
// 0 !HISTORY 2008-07-01 [PTadmin] Official Update 2008-01
// 
// 
// 2 24 1 1 1 -1 1 1
  [2,24,1,1,1,-1,1,1],
// 2 24 -1 1 1 -1 1 -1
  [2,24,-1,1,1,-1,1,-1],
// 2 24 -1 1 -1 1 1 -1
  [2,24,-1,1,-1,1,1,-1],
// 2 24 1 1 -1 1 1 1
  [2,24,1,1,-1,1,1,1],
// 2 24 1 0 1 -1 0 1
  [2,24,1,0,1,-1,0,1],
// 2 24 -1 0 1 -1 0 -1
  [2,24,-1,0,1,-1,0,-1],
// 2 24 -1 0 -1 1 0 -1
  [2,24,-1,0,-1,1,0,-1],
// 2 24 1 0 -1 1 0 1
  [2,24,1,0,-1,1,0,1],
// 2 24 1 0 1 1 1 1
  [2,24,1,0,1,1,1,1],
// 2 24 -1 0 1 -1 1 1
  [2,24,-1,0,1,-1,1,1],
// 2 24 1 0 -1 1 1 -1
  [2,24,1,0,-1,1,1,-1],
// 2 24 -1 0 -1 -1 1 -1
  [2,24,-1,0,-1,-1,1,-1],
// 4 16 1 1 1 1 1 -1 -1 1 -1 -1 1 1
  [4,16,1,1,1,1,1,-1,-1,1,-1,-1,1,1],
// 4 16 1 1 1 -1 1 1 -1 0 1 1 0 1
  [4,16,1,1,1,-1,1,1,-1,0,1,1,0,1],
// 4 16 -1 1 1 -1 1 -1 -1 0 -1 -1 0 1
  [4,16,-1,1,1,-1,1,-1,-1,0,-1,-1,0,1],
// 0 4 16 -1 1 -1 -1 0 -1 1 0 -1 1 1 -1
// 4 16 1 1 -1 1 1 1 1 0 1 1 0 -1
  [4,16,1,1,-1,1,1,1,1,0,1,1,0,-1],
// 0
];
module ldraw_lib__box4t(step=0, col=false, unit=2/5, alt=false, line=0.2, solid=!$preview)
    makepoly(ldraw_lib__box4t(solid), step=step, col=col, unit=unit, alt=alt, line=line, solid=solid);
ldraw_lib__box4t(line=0.2);
// file: 3004.scad
use <../lib.scad>
use <s/3004s01.scad>
$fa=1; $fs=0.2;
function ldraw_lib__3004(realsolid=false) = [
// 0 Brick  1 x  2
// 0 Name: 3004.dat
// 0 Author: James Jessiman
// 0 !LDRAW_ORG Part UPDATE 2022-05
// 0 !LICENSE Licensed under CC BY 2.0 and CC BY 4.0 : see CAreadme.txt
// 
// 0 BFC CERTIFY CCW
  [0,"BFC","CERTIFY"],
  [0,"BFC","CCW"],
// 
// 0 !HISTORY 2001-10-26 [PTadmin] Official Update 2001-01
// 0 !HISTORY 2002-05-07 {unknown} BFC Certification
// 0 !HISTORY 2002-06-11 [PTadmin] Official Update 2002-03
// 0 !HISTORY 2007-05-07 [PTadmin] Header formatted for Contributor Agreement
// 0 !HISTORY 2008-07-01 [PTadmin] Official Update 2008-01
// 0 !HISTORY 2022-08-04 [MagFors] Using subfile
// 0 !HISTORY 2022-09-15 [PTadmin] Official Update 2022-05
// 
// 
// 1 16 0 0 0 1 0 0 0 1 0 0 0 1 s\3004s01.dat
  [1,16,0,0,0,1,0,0,0,1,0,0,0,1, ldraw_lib__s__3004s01(realsolid)],
// 4 16 -20 24 -10 20 24 -10 20 0 -10 -20 0 -10
  [4,16,-20,24,-10,20,24,-10,20,0,-10,-20,0,-10],
];
module ldraw_lib__3004(step=0, col=false, unit=2/5, alt=false, line=0.2, solid=!$preview)
    makepoly(ldraw_lib__3004(solid), step=step, col=col, unit=unit, alt=alt, line=line, solid=solid);
ldraw_lib__3004(line=0.2);
// file: s/3024s01.scad
use <../../lib.scad>
use <../../p/box4t.scad>
use <../../p/box5.scad>
use <../../p/stud.scad>
$fa=1; $fs=0.2;
function ldraw_lib__s__3024s01(realsolid=false) = [
// 0 ~Plate  1 x  1 without Front Face
// 0 Name: s\3024s01.dat
// 0 Author: Tore Eriksson [Tore_Eriksson]
// 0 !LDRAW_ORG Subpart UPDATE 2012-03
// 0 !LICENSE Licensed under CC BY 2.0 and CC BY 4.0 : see CAreadme.txt
// 
// 0 BFC CERTIFY CCW
  [0,"BFC","CERTIFY"],
  [0,"BFC","CCW"],
// 
// 0 !HISTORY 2012-12-28 [PTadmin] Official Update 2012-03
// 
// 
// 0 BFC INVERTNEXT
  [0,"BFC","INVERTNEXT"],
// 1 16 0 8 0 0 0 6 0 -4 0 -6 0 0 box5.dat
  [1,16,0,8,0,0,0,6,0,-4,0,-6,0,0, ldraw_lib__box5(realsolid)],
// 4 16 10 8 -10 6 8 -6 6 8 6 10 8 10
  [4,16,10,8,-10,6,8,-6,6,8,6,10,8,10],
// 4 16 10 8 10 6 8 6 -6 8 6 -10 8 10
  [4,16,10,8,10,6,8,6,-6,8,6,-10,8,10],
// 4 16 -10 8 10 -6 8 6 -6 8 -6 -10 8 -10
  [4,16,-10,8,10,-6,8,6,-6,8,-6,-10,8,-10],
// 4 16 -10 8 -10 -6 8 -6 6 8 -6 10 8 -10
  [4,16,-10,8,-10,-6,8,-6,6,8,-6,10,8,-10],
// 1 16 0 8 0 10 0 0 0 -8 0 0 0 10 box4t.dat
  [1,16,0,8,0,10,0,0,0,-8,0,0,0,10, ldraw_lib__box4t(realsolid)],
// 1 16 0 0 0 0 0 1 0 1 0 -1 0 0 stud.dat
  [1,16,0,0,0,0,0,1,0,1,0,-1,0,0, ldraw_lib__stud(realsolid)],
];
module ldraw_lib__s__3024s01(step=0, col=false, unit=2/5, alt=false, line=0.2, solid=!$preview)
    makepoly(ldraw_lib__s__3024s01(solid), step=step, col=col, unit=unit, alt=alt, line=line, solid=solid);
ldraw_lib__s__3024s01(line=0.2);
// main file
use <../lib.scad>
use <s/3024s01.scad>
$fa=1; $fs=0.2;
function ldraw_lib__3024ptc8(realsolid=false) = [
// 0 Plate  1 x  1 with Minecraft Micro Mob Enderman Eyes Pattern
// 0 Name: 3024ptc8.dat
// 0 Author: Owen Burgoyne [C3POwen]
// 0 !LDRAW_ORG Part UPDATE 2014-02
// 0 !LICENSE Licensed under CC BY 2.0 and CC BY 4.0 : see CAreadme.txt
// 
// 0 BFC CERTIFY CCW
  [0,"BFC","CERTIFY"],
  [0,"BFC","CCW"],
// 
// 0 !KEYWORDS Ender Dragon, The End
// 
// 0 !HISTORY 2014-12-23 [PTadmin] Official Update 2014-02
// 
// 
// 0 // 2.5 x 2.44 LDu pixels, 0.25 LDu top/bottom border, 0.24 LDu left/right border
// 
// 1 16 0 0 0 1 0 0 0 1 0 0 0 1 s\3024s01.dat
  [1,16,0,0,0,1,0,0,0,1,0,0,0,1, ldraw_lib__s__3024s01(realsolid)],
// 4 29 -9.76 5.25 -10 -9.76 7.75 -10 -7.32 7.75 -10 -7.32 5.25 -10
  [4,29,-9.76,5.25,-10,-9.76,7.75,-10,-7.32,7.75,-10,-7.32,5.25,-10],
// 4 26 -7.32 5.25 -10 -7.32 7.75 -10 -4.88 7.75 -10 -4.88 5.25 -10
  [4,26,-7.32,5.25,-10,-7.32,7.75,-10,-4.88,7.75,-10,-4.88,5.25,-10],
// 4 29 -4.88 5.25 -10 -4.88 7.75 -10 -2.44 7.75 -10 -2.44 5.25 -10
  [4,29,-4.88,5.25,-10,-4.88,7.75,-10,-2.44,7.75,-10,-2.44,5.25,-10],
// 4 16 -2.44 5.25 -10 -2.44 7.75 -10 2.44 7.75 -10 2.44 5.25 -10
  [4,16,-2.44,5.25,-10,-2.44,7.75,-10,2.44,7.75,-10,2.44,5.25,-10],
// 4 29 2.44 5.25 -10 2.44 7.75 -10 4.88 7.75 -10 4.88 5.25 -10
  [4,29,2.44,5.25,-10,2.44,7.75,-10,4.88,7.75,-10,4.88,5.25,-10],
// 4 26 4.88 5.25 -10 4.88 7.75 -10 7.32 7.75 -10 7.32 5.25 -10
  [4,26,4.88,5.25,-10,4.88,7.75,-10,7.32,7.75,-10,7.32,5.25,-10],
// 4 29 7.32 5.25 -10 7.32 7.75 -10 9.76 7.75 -10 9.76 5.25 -10
  [4,29,7.32,5.25,-10,7.32,7.75,-10,9.76,7.75,-10,9.76,5.25,-10],
// 4 16 -10 0 -10 -10 8 -10 -9.76 7.75 -10 -9.76 5.25 -10
  [4,16,-10,0,-10,-10,8,-10,-9.76,7.75,-10,-9.76,5.25,-10],
// 3 16 -7.32 7.75 -10 -9.76 7.75 -10 -10 8 -10
  [3,16,-7.32,7.75,-10,-9.76,7.75,-10,-10,8,-10],
// 3 16 -4.88 7.75 -10 -7.32 7.75 -10 -10 8 -10
  [3,16,-4.88,7.75,-10,-7.32,7.75,-10,-10,8,-10],
// 3 16 -2.44 7.75 -10 -4.88 7.75 -10 -10 8 -10
  [3,16,-2.44,7.75,-10,-4.88,7.75,-10,-10,8,-10],
// 4 16 -10 8 -10 10 8 -10 2.44 7.75 -10 -2.44 7.75 -10
  [4,16,-10,8,-10,10,8,-10,2.44,7.75,-10,-2.44,7.75,-10],
// 3 16 10 8 -10 4.88 7.75 -10 2.44 7.75 -10
  [3,16,10,8,-10,4.88,7.75,-10,2.44,7.75,-10],
// 3 16 10 8 -10 7.32 7.75 -10 4.88 7.75 -10
  [3,16,10,8,-10,7.32,7.75,-10,4.88,7.75,-10],
// 3 16 10 8 -10 9.76 7.75 -10 7.32 7.75 -10
  [3,16,10,8,-10,9.76,7.75,-10,7.32,7.75,-10],
// 4 16 9.76 5.25 -10 9.76 7.75 -10 10 8 -10 10 0 -10
  [4,16,9.76,5.25,-10,9.76,7.75,-10,10,8,-10,10,0,-10],
// 3 16 -10 0 -10 -9.76 5.25 -10 -7.32 5.25 -10
  [3,16,-10,0,-10,-9.76,5.25,-10,-7.32,5.25,-10],
// 3 16 -10 0 -10 -7.32 5.25 -10 -4.88 5.25 -10
  [3,16,-10,0,-10,-7.32,5.25,-10,-4.88,5.25,-10],
// 3 16 -10 0 -10 -4.88 5.25 -10 -2.44 5.25 -10
  [3,16,-10,0,-10,-4.88,5.25,-10,-2.44,5.25,-10],
// 4 16 10 0 -10 -10 0 -10 -2.44 5.25 -10 2.44 5.25 -10
  [4,16,10,0,-10,-10,0,-10,-2.44,5.25,-10,2.44,5.25,-10],
// 3 16 2.44 5.25 -10 4.88 5.25 -10 10 0 -10
  [3,16,2.44,5.25,-10,4.88,5.25,-10,10,0,-10],
// 3 16 4.88 5.25 -10 7.32 5.25 -10 10 0 -10
  [3,16,4.88,5.25,-10,7.32,5.25,-10,10,0,-10],
// 3 16 7.32 5.25 -10 9.76 5.25 -10 10 0 -10
  [3,16,7.32,5.25,-10,9.76,5.25,-10,10,0,-10],
];
module ldraw_lib__3024ptc8(step=0, col=false, unit=2/5, alt=false, line=0.2, solid=!$preview)
    makepoly(ldraw_lib__3024ptc8(solid), step=step, col=col, unit=unit, alt=alt, line=line, solid=solid);
ldraw_lib__3024ptc8(line=0.2);
